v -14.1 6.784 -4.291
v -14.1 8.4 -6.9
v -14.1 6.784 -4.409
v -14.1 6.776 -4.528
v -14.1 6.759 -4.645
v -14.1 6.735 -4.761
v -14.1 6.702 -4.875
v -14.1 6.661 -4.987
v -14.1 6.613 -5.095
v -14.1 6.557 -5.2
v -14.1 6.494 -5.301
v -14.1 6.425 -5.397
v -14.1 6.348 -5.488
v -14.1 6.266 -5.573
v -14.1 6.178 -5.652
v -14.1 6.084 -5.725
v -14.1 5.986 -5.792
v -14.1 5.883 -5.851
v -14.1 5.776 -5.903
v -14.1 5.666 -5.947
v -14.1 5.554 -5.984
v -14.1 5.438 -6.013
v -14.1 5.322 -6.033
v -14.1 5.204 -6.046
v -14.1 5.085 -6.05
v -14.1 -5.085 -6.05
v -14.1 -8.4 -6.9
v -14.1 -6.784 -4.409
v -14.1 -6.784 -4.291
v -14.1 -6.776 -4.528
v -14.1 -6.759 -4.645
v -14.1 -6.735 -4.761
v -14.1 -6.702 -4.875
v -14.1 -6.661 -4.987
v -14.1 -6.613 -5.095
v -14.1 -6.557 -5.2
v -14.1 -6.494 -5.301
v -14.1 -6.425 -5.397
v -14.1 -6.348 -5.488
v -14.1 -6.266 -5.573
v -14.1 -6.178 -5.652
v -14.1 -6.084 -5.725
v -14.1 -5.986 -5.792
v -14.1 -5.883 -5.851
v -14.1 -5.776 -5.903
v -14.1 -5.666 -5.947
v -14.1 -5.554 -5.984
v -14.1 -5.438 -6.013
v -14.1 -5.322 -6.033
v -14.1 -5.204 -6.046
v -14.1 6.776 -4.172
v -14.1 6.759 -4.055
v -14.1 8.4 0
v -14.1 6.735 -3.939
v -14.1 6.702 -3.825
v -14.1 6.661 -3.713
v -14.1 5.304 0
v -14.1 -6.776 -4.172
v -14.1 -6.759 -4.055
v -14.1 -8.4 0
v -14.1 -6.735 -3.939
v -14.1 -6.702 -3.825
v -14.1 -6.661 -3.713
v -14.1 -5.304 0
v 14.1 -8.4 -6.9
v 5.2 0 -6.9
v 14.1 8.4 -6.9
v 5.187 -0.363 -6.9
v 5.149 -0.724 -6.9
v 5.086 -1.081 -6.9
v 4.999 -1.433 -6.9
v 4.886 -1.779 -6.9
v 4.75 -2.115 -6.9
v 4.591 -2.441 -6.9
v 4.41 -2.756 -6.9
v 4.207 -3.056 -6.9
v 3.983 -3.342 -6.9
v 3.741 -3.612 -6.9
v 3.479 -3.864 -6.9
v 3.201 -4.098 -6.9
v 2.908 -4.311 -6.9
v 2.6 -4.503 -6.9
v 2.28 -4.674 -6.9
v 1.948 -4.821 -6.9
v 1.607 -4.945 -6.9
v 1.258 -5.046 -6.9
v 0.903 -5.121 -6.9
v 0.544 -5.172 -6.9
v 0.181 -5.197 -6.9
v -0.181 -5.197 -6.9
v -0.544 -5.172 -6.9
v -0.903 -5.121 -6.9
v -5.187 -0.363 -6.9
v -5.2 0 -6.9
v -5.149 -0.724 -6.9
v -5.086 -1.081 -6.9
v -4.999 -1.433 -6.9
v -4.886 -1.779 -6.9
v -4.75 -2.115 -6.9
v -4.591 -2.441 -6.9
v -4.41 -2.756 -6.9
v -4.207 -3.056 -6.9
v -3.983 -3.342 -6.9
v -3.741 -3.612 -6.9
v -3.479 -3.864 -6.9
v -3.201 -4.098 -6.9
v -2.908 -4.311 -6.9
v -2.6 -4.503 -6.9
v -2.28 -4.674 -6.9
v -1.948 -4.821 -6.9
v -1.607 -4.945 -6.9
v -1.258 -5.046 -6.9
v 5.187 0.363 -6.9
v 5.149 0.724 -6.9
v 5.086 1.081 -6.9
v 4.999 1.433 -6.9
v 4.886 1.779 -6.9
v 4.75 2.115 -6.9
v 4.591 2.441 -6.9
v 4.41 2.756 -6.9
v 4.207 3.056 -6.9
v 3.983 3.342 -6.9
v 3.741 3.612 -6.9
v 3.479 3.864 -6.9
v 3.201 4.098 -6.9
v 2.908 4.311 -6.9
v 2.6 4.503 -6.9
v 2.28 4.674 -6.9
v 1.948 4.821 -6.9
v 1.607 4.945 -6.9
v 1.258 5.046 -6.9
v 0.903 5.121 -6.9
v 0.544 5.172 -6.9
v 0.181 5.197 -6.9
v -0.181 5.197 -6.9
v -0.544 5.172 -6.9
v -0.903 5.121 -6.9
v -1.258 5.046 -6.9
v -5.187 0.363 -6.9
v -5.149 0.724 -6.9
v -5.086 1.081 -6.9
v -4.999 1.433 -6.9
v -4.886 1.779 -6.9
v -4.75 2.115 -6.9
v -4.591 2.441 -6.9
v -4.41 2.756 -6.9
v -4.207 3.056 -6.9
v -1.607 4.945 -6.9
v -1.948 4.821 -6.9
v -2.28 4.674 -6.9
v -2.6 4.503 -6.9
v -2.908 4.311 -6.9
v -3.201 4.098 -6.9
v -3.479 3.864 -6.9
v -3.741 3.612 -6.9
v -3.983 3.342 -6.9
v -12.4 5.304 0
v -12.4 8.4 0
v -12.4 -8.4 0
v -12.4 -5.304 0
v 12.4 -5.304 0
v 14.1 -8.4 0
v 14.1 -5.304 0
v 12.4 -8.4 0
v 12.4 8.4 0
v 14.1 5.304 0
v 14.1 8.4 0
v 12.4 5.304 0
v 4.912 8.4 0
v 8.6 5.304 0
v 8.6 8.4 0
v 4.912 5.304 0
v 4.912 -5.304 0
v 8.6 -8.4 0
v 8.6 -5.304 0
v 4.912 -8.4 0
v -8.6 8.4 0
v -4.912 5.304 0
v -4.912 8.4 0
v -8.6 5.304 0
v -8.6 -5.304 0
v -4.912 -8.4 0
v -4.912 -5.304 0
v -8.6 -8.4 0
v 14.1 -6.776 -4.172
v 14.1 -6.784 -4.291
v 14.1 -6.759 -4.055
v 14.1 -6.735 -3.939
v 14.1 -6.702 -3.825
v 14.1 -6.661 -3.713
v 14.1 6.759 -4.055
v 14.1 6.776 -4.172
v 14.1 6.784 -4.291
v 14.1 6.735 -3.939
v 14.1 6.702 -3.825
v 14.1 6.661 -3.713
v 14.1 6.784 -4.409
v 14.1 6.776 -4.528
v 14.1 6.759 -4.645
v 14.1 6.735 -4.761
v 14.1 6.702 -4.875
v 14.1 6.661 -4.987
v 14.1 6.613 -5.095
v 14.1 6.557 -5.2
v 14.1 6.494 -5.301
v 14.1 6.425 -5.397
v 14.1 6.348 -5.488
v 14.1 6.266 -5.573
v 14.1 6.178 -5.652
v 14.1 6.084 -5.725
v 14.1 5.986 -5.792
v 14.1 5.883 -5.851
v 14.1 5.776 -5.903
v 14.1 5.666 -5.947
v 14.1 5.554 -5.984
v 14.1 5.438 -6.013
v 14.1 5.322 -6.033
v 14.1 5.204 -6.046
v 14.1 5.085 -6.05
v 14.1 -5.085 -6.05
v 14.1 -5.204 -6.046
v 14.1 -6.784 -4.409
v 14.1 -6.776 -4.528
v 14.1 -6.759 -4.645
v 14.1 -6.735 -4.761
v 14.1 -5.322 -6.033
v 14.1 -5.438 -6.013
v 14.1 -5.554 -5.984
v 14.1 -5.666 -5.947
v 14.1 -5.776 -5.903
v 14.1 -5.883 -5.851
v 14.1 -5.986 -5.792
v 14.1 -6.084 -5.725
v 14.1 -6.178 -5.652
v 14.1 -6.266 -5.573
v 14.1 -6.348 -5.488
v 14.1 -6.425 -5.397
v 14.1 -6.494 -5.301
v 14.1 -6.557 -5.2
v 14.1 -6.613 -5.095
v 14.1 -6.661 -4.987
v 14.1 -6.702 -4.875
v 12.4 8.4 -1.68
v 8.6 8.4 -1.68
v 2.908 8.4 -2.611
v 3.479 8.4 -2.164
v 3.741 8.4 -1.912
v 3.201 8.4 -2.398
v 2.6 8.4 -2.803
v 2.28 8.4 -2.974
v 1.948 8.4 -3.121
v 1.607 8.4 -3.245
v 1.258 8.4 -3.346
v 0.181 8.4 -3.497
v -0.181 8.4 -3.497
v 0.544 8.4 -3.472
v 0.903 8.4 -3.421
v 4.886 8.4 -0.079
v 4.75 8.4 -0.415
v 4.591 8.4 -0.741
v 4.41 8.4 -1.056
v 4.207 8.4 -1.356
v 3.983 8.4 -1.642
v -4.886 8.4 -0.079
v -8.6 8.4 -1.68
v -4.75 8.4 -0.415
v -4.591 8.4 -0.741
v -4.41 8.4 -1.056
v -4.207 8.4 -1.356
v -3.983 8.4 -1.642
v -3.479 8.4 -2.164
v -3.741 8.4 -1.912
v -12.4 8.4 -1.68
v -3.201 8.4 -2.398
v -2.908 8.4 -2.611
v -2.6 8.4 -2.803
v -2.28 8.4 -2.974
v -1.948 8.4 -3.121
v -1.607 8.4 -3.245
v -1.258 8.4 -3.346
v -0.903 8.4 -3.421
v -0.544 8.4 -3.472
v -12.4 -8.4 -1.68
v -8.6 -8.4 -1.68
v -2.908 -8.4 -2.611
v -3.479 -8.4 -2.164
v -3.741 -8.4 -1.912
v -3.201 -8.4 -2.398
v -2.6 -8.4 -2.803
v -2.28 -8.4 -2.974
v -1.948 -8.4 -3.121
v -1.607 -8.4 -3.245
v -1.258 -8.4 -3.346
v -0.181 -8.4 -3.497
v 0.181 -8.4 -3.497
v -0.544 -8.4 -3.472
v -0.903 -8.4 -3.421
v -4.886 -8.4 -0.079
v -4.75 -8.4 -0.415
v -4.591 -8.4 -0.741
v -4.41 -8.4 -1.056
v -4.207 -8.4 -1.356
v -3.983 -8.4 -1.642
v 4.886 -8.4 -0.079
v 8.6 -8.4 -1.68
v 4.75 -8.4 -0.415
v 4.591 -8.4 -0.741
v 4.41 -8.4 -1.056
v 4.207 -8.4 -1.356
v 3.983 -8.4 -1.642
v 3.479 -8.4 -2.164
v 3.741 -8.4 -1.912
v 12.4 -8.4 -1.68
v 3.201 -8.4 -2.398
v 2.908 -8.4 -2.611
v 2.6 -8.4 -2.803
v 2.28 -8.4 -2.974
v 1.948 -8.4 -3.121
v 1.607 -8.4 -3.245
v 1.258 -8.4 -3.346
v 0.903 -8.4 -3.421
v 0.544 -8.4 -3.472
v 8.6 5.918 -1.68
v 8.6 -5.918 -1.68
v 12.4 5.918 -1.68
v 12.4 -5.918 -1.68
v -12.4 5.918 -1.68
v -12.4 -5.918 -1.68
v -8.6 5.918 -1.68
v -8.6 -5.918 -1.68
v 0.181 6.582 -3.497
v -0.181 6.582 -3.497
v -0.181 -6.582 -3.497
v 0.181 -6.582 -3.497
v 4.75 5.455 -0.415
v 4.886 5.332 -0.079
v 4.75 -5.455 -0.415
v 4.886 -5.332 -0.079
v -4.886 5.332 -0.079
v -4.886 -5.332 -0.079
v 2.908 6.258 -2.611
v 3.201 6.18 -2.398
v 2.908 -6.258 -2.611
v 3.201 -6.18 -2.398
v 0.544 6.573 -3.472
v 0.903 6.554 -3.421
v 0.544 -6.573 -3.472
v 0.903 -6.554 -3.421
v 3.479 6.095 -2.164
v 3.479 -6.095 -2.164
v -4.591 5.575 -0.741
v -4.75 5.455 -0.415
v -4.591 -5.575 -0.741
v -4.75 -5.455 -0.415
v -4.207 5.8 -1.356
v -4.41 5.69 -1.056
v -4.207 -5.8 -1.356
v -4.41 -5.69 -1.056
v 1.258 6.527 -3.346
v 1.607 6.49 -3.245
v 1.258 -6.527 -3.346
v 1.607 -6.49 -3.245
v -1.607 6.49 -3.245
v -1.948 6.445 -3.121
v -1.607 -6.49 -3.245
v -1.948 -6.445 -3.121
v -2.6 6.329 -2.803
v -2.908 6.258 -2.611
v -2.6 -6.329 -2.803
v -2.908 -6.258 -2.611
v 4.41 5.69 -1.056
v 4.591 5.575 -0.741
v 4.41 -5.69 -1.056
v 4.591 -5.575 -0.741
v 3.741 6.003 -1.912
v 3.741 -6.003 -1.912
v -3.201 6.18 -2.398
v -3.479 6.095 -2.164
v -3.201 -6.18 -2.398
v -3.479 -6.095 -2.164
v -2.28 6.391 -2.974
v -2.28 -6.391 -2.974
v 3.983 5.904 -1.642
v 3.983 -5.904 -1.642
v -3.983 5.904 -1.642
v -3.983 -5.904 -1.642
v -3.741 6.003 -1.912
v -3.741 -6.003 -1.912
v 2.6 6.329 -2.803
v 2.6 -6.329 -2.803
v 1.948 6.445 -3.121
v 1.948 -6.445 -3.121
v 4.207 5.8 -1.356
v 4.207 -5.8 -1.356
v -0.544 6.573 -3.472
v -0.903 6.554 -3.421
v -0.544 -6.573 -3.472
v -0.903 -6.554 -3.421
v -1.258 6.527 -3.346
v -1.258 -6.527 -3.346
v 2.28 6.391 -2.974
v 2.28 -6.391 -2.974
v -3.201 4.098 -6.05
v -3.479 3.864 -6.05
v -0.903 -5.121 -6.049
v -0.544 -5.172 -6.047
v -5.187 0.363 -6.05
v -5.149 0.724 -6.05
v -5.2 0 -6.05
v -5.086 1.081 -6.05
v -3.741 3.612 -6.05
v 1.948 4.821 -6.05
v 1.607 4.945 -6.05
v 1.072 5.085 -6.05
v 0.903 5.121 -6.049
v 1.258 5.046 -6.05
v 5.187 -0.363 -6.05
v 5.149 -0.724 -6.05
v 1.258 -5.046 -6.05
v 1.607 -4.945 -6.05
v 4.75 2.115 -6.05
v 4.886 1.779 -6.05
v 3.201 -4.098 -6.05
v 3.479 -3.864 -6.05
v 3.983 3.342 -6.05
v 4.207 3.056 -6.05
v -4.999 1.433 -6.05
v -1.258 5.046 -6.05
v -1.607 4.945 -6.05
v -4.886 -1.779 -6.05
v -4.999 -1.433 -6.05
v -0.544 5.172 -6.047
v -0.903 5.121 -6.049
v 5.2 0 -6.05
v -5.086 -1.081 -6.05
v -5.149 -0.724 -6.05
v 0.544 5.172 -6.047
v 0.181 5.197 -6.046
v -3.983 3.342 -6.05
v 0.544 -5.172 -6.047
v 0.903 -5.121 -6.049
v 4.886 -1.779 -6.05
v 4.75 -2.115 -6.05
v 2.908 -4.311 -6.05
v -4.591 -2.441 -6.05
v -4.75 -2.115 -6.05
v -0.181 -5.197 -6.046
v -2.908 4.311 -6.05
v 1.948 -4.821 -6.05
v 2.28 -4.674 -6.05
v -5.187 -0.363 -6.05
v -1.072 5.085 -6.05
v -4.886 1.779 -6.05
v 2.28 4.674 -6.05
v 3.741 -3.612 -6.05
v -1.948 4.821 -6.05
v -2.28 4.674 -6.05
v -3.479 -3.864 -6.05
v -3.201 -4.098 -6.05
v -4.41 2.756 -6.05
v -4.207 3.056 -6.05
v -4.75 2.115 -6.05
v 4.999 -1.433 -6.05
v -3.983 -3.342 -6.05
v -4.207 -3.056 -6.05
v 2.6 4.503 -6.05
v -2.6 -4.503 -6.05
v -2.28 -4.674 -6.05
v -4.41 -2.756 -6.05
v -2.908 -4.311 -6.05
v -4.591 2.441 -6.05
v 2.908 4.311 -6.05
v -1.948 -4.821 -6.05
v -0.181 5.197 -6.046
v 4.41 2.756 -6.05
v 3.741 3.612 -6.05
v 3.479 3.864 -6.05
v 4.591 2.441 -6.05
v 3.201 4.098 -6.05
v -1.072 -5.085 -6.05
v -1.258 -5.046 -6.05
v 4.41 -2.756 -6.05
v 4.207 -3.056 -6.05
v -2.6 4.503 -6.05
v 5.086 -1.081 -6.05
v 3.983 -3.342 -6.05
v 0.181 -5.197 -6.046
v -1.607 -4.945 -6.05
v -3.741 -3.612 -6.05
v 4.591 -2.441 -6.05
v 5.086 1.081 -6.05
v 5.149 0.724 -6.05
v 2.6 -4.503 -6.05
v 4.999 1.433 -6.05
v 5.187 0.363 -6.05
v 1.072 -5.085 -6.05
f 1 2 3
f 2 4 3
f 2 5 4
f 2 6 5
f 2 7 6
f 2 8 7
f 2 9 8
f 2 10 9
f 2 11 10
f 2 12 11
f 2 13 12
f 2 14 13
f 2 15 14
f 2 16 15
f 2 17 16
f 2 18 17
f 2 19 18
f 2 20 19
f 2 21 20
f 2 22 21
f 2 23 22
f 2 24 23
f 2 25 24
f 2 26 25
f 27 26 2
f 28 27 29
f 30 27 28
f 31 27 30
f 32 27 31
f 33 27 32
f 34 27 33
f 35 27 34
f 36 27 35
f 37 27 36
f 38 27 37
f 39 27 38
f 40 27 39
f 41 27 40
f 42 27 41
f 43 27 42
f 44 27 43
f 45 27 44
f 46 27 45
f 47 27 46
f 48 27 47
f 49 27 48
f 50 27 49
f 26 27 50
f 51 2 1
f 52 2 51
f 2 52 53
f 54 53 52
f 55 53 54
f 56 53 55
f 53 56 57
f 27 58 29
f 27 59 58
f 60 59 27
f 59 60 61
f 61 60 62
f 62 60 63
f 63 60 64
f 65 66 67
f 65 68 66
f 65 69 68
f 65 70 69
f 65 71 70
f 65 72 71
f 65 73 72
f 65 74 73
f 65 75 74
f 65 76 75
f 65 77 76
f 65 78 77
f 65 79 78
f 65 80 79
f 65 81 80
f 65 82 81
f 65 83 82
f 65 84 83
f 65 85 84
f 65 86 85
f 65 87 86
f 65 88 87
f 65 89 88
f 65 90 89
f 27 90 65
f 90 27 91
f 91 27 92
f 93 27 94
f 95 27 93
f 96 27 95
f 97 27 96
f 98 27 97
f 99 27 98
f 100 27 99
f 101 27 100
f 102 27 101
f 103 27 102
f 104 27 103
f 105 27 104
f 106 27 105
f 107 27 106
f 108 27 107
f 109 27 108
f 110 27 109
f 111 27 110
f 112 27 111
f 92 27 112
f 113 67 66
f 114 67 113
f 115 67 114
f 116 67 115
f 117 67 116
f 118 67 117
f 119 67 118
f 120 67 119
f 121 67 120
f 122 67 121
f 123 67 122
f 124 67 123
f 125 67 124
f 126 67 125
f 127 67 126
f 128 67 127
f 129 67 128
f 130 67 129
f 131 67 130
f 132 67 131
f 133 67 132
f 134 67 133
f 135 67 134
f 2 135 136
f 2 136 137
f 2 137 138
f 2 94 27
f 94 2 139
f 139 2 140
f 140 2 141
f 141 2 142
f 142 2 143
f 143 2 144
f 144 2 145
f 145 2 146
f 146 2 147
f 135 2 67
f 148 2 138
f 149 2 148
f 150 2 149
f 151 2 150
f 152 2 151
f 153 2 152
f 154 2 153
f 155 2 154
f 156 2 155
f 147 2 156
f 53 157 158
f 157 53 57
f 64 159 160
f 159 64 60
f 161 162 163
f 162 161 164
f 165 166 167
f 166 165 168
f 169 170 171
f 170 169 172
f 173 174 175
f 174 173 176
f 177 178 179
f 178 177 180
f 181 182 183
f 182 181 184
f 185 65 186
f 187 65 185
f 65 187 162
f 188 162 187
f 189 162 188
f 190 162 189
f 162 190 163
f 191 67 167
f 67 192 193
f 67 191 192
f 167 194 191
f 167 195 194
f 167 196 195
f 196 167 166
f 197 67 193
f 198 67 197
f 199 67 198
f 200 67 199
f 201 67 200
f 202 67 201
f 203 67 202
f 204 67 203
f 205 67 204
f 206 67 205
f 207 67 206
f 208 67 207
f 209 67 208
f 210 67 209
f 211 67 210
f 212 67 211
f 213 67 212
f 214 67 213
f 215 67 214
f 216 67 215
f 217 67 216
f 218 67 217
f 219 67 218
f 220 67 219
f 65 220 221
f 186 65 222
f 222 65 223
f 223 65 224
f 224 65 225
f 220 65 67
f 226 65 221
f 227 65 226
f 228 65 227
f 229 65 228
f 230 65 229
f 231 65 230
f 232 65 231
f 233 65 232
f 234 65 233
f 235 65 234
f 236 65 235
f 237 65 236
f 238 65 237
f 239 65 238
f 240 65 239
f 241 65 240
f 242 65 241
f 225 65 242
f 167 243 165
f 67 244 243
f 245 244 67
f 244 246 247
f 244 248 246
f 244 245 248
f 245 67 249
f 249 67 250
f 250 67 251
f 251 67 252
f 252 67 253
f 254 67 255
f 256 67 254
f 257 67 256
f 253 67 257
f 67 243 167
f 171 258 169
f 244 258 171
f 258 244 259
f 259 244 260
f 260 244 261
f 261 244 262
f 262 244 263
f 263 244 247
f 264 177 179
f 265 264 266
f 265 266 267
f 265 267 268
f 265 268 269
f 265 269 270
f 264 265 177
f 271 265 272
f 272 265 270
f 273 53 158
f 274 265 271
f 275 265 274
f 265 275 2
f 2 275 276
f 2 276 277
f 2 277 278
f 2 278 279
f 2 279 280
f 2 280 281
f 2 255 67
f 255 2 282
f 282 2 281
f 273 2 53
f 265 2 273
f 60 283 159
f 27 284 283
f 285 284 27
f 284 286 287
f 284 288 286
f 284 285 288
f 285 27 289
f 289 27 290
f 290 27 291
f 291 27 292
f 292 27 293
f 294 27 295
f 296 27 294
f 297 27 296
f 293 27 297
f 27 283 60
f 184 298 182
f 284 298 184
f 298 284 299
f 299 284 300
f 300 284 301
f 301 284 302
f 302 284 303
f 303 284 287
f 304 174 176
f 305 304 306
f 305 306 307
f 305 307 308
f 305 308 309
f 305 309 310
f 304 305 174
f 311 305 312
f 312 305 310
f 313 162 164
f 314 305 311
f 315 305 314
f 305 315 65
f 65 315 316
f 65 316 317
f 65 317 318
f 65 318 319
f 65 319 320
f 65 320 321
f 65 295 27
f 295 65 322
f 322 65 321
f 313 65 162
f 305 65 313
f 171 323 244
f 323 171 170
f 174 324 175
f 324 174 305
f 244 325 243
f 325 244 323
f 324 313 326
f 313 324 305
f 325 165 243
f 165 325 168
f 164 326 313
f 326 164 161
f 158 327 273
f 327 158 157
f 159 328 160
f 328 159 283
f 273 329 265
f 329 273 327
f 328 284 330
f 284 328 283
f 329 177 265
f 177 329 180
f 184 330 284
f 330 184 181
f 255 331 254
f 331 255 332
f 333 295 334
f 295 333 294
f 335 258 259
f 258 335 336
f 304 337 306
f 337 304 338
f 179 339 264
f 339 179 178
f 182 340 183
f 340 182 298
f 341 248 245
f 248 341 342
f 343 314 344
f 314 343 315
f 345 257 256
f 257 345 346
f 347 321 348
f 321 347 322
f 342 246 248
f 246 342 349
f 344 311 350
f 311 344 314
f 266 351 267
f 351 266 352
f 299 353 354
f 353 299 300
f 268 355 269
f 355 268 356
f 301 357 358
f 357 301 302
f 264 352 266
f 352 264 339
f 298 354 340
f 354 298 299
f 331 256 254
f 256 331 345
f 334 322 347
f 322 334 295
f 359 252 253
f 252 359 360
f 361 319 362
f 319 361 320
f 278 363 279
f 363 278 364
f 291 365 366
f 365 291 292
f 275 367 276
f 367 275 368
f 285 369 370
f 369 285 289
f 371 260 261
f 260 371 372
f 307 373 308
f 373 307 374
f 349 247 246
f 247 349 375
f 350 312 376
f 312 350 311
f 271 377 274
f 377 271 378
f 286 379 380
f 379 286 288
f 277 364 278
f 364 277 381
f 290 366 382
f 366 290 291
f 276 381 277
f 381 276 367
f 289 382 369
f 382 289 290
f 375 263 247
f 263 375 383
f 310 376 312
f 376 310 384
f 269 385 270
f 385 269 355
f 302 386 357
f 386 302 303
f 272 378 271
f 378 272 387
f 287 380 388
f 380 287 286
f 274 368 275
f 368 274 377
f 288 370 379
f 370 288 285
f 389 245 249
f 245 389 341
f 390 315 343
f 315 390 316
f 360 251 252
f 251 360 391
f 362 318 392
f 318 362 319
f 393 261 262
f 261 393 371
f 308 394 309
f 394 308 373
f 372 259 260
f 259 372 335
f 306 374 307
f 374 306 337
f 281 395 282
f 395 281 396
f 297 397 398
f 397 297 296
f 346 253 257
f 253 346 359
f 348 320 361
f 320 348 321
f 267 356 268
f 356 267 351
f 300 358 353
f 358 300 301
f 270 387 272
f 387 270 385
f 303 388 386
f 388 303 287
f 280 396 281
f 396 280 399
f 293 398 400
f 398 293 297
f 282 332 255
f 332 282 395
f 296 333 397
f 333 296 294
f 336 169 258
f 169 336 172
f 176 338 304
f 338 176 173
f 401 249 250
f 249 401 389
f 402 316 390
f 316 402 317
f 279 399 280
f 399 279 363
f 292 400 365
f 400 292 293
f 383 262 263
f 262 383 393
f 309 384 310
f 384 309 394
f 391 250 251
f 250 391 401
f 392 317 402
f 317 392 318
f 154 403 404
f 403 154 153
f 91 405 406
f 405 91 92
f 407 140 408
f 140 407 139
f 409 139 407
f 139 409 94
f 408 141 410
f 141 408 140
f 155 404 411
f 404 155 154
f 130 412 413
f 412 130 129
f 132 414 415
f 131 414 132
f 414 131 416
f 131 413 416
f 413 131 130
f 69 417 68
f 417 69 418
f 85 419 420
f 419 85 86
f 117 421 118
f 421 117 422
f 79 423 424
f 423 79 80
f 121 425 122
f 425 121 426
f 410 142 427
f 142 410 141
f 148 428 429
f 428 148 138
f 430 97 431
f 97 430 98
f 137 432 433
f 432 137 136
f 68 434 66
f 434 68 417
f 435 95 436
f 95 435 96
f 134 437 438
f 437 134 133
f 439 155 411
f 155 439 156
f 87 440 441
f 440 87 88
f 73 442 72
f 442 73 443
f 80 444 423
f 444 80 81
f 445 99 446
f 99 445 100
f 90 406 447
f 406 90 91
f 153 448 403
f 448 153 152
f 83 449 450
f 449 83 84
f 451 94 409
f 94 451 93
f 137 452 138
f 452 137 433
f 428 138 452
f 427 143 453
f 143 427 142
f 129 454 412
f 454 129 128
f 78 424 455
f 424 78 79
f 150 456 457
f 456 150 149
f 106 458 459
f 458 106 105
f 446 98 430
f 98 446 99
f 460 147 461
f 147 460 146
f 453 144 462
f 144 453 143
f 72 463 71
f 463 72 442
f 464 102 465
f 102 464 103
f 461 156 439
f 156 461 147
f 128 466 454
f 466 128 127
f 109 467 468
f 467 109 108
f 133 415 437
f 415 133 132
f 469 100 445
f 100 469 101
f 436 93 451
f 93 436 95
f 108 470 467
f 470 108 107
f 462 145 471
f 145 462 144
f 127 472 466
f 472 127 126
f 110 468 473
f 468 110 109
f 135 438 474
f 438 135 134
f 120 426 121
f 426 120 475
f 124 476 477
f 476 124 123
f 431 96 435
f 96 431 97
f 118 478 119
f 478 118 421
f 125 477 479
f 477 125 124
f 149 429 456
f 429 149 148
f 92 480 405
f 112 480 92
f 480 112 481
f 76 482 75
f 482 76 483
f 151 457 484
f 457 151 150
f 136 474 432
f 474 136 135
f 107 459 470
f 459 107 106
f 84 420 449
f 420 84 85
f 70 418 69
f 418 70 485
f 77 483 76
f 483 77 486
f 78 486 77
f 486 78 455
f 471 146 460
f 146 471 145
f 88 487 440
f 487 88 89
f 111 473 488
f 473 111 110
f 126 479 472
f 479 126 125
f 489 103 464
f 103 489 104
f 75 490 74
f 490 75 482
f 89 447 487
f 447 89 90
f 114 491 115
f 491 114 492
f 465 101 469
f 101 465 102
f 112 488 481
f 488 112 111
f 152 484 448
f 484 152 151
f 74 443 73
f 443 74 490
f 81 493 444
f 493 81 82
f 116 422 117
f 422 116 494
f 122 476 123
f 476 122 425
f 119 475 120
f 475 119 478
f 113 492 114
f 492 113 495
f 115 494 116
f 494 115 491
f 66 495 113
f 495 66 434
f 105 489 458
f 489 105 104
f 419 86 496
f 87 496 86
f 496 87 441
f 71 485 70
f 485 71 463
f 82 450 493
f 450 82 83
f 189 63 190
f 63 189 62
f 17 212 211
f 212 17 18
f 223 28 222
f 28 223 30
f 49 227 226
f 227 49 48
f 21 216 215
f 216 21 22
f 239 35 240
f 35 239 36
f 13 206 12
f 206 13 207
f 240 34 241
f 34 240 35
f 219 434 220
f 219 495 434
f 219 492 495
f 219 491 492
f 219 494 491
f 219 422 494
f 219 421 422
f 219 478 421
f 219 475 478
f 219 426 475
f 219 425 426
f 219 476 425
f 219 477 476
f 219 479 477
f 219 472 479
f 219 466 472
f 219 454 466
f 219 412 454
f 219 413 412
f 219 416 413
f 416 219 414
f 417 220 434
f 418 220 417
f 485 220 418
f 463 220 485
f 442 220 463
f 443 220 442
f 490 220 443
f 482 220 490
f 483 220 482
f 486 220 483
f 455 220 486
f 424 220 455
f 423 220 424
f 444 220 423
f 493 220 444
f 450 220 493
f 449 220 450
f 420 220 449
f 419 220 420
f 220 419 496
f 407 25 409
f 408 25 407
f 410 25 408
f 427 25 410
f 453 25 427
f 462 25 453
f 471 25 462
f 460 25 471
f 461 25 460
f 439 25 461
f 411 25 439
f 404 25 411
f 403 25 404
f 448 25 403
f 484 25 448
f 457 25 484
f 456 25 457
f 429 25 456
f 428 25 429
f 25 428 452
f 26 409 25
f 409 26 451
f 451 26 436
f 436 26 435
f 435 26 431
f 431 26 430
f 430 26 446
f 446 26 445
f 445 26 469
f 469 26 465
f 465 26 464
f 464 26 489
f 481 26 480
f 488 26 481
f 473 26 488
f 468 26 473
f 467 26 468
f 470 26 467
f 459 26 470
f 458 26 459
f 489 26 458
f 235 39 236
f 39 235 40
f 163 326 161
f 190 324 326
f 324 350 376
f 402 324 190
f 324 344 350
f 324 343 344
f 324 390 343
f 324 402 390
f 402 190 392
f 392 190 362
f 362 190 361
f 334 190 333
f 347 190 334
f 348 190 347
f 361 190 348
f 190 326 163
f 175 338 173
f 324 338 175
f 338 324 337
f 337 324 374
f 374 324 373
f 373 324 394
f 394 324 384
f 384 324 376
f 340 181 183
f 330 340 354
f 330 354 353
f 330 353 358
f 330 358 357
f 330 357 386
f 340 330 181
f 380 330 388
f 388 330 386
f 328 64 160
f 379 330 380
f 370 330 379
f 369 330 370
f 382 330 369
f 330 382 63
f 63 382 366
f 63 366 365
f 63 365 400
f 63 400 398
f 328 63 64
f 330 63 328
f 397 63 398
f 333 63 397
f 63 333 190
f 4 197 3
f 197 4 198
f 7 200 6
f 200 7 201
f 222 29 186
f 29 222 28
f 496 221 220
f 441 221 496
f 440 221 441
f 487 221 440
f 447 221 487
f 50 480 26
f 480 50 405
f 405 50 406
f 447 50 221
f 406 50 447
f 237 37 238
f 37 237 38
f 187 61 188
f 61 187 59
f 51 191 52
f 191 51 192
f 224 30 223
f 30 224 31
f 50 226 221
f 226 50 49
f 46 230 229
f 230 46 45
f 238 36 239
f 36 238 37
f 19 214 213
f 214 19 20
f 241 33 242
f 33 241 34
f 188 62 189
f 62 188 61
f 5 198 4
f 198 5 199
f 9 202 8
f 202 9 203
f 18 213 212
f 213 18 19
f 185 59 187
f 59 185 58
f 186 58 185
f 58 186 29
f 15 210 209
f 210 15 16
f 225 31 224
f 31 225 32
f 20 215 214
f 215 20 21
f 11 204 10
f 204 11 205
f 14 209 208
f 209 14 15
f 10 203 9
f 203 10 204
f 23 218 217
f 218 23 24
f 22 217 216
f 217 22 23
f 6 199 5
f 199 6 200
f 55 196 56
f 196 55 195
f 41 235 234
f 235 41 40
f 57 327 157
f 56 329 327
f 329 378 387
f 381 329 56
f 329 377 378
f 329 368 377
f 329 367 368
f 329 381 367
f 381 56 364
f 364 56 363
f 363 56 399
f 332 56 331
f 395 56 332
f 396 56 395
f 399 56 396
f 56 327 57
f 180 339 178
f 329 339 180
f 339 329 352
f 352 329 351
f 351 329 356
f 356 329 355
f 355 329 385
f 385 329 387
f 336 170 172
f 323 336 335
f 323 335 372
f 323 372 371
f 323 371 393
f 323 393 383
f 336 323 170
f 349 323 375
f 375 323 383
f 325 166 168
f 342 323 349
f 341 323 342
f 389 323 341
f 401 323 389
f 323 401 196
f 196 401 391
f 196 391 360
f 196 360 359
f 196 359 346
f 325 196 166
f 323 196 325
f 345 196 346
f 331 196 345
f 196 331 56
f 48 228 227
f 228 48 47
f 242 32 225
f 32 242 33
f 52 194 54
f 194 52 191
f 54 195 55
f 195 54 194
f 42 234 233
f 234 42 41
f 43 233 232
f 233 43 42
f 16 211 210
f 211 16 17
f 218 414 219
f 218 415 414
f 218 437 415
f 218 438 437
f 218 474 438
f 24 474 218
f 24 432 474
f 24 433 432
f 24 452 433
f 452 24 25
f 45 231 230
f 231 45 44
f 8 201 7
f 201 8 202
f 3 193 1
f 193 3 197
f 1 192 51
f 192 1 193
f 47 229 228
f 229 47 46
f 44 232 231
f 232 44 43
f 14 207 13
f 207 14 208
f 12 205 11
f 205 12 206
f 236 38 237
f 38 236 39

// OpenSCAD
// Happymodel Mobula 8 1s battery shim
// 2023-08-17 add notes and format cleanup
// 2023-08-16 reduce BatteryThick -packs are not square and bend plasic frame
// 2023-08-15 first draft

//$fn=18;
$fn=90;

BatteryLength=60.25;
BatteryWidth=16.8;
BatteryThick=5.2; // 7mm acutal but setting smaller since they are not square

TrayStrapShift=21*0.5;
TrayStrap=3.8;
TrayWidth=20;
TrayThick=1.7;

xt30Width=10.6;

// main model
rotate([0,180,0]) BatteryShim();

// test pack
//rotate([0,180,0]) color("gray") translate([-BatteryLength*0.5,-BatteryWidth*0.5,BatteryThick+TrayThick]) cube([BatteryLength,BatteryWidth,BatteryThick]);

module BatteryShim(){
    difference(){
        translate([-(TrayStrapShift*2+TrayStrap+TrayThick*2)*0.5,-BatteryWidth*0.5,0]) cube([(TrayStrapShift*2+TrayStrap+TrayThick*2),BatteryWidth,BatteryThick+TrayThick]);
        // begin difference items
        // Strap path 1
        translate([-TrayStrapShift,0,TrayThick*0.5-0.02]) cube([TrayStrap,BatteryWidth+TrayThick*2,TrayThick],true);
        // Strap path 2
        translate([+TrayStrapShift,0,TrayThick*0.5-0.02]) cube([TrayStrap,BatteryWidth+TrayThick*2,TrayThick],true);
        // center arch
        translate([0,0,-TrayThick]) rotate([90,0,0]) cylinder(BatteryWidth+0.04,BatteryThick,BatteryThick,true);
        // center hole
        cylinder(BatteryWidth+TrayThick+0.04,BatteryThick,BatteryThick,true);
        // cable passage
        hull(){    
            cube([TrayStrapShift*2+TrayStrap+TrayThick*2+0.04,xt30Width,0.02],true);
            translate([0,-(BatteryWidth*0.5-TrayThick*1.95),BatteryThick-TrayThick*0.5]) rotate([0,90,0]) cylinder(TrayStrapShift*2+TrayStrap+TrayThick*2+0.04, TrayThick,TrayThick,true);
            translate([0,+(BatteryWidth*0.5-TrayThick*1.95),BatteryThick-TrayThick*0.5]) rotate([0,90,0]) cylinder(TrayStrapShift*2+TrayStrap+TrayThick*2+0.04,TrayThick,TrayThick,true);
        }
    }
}
